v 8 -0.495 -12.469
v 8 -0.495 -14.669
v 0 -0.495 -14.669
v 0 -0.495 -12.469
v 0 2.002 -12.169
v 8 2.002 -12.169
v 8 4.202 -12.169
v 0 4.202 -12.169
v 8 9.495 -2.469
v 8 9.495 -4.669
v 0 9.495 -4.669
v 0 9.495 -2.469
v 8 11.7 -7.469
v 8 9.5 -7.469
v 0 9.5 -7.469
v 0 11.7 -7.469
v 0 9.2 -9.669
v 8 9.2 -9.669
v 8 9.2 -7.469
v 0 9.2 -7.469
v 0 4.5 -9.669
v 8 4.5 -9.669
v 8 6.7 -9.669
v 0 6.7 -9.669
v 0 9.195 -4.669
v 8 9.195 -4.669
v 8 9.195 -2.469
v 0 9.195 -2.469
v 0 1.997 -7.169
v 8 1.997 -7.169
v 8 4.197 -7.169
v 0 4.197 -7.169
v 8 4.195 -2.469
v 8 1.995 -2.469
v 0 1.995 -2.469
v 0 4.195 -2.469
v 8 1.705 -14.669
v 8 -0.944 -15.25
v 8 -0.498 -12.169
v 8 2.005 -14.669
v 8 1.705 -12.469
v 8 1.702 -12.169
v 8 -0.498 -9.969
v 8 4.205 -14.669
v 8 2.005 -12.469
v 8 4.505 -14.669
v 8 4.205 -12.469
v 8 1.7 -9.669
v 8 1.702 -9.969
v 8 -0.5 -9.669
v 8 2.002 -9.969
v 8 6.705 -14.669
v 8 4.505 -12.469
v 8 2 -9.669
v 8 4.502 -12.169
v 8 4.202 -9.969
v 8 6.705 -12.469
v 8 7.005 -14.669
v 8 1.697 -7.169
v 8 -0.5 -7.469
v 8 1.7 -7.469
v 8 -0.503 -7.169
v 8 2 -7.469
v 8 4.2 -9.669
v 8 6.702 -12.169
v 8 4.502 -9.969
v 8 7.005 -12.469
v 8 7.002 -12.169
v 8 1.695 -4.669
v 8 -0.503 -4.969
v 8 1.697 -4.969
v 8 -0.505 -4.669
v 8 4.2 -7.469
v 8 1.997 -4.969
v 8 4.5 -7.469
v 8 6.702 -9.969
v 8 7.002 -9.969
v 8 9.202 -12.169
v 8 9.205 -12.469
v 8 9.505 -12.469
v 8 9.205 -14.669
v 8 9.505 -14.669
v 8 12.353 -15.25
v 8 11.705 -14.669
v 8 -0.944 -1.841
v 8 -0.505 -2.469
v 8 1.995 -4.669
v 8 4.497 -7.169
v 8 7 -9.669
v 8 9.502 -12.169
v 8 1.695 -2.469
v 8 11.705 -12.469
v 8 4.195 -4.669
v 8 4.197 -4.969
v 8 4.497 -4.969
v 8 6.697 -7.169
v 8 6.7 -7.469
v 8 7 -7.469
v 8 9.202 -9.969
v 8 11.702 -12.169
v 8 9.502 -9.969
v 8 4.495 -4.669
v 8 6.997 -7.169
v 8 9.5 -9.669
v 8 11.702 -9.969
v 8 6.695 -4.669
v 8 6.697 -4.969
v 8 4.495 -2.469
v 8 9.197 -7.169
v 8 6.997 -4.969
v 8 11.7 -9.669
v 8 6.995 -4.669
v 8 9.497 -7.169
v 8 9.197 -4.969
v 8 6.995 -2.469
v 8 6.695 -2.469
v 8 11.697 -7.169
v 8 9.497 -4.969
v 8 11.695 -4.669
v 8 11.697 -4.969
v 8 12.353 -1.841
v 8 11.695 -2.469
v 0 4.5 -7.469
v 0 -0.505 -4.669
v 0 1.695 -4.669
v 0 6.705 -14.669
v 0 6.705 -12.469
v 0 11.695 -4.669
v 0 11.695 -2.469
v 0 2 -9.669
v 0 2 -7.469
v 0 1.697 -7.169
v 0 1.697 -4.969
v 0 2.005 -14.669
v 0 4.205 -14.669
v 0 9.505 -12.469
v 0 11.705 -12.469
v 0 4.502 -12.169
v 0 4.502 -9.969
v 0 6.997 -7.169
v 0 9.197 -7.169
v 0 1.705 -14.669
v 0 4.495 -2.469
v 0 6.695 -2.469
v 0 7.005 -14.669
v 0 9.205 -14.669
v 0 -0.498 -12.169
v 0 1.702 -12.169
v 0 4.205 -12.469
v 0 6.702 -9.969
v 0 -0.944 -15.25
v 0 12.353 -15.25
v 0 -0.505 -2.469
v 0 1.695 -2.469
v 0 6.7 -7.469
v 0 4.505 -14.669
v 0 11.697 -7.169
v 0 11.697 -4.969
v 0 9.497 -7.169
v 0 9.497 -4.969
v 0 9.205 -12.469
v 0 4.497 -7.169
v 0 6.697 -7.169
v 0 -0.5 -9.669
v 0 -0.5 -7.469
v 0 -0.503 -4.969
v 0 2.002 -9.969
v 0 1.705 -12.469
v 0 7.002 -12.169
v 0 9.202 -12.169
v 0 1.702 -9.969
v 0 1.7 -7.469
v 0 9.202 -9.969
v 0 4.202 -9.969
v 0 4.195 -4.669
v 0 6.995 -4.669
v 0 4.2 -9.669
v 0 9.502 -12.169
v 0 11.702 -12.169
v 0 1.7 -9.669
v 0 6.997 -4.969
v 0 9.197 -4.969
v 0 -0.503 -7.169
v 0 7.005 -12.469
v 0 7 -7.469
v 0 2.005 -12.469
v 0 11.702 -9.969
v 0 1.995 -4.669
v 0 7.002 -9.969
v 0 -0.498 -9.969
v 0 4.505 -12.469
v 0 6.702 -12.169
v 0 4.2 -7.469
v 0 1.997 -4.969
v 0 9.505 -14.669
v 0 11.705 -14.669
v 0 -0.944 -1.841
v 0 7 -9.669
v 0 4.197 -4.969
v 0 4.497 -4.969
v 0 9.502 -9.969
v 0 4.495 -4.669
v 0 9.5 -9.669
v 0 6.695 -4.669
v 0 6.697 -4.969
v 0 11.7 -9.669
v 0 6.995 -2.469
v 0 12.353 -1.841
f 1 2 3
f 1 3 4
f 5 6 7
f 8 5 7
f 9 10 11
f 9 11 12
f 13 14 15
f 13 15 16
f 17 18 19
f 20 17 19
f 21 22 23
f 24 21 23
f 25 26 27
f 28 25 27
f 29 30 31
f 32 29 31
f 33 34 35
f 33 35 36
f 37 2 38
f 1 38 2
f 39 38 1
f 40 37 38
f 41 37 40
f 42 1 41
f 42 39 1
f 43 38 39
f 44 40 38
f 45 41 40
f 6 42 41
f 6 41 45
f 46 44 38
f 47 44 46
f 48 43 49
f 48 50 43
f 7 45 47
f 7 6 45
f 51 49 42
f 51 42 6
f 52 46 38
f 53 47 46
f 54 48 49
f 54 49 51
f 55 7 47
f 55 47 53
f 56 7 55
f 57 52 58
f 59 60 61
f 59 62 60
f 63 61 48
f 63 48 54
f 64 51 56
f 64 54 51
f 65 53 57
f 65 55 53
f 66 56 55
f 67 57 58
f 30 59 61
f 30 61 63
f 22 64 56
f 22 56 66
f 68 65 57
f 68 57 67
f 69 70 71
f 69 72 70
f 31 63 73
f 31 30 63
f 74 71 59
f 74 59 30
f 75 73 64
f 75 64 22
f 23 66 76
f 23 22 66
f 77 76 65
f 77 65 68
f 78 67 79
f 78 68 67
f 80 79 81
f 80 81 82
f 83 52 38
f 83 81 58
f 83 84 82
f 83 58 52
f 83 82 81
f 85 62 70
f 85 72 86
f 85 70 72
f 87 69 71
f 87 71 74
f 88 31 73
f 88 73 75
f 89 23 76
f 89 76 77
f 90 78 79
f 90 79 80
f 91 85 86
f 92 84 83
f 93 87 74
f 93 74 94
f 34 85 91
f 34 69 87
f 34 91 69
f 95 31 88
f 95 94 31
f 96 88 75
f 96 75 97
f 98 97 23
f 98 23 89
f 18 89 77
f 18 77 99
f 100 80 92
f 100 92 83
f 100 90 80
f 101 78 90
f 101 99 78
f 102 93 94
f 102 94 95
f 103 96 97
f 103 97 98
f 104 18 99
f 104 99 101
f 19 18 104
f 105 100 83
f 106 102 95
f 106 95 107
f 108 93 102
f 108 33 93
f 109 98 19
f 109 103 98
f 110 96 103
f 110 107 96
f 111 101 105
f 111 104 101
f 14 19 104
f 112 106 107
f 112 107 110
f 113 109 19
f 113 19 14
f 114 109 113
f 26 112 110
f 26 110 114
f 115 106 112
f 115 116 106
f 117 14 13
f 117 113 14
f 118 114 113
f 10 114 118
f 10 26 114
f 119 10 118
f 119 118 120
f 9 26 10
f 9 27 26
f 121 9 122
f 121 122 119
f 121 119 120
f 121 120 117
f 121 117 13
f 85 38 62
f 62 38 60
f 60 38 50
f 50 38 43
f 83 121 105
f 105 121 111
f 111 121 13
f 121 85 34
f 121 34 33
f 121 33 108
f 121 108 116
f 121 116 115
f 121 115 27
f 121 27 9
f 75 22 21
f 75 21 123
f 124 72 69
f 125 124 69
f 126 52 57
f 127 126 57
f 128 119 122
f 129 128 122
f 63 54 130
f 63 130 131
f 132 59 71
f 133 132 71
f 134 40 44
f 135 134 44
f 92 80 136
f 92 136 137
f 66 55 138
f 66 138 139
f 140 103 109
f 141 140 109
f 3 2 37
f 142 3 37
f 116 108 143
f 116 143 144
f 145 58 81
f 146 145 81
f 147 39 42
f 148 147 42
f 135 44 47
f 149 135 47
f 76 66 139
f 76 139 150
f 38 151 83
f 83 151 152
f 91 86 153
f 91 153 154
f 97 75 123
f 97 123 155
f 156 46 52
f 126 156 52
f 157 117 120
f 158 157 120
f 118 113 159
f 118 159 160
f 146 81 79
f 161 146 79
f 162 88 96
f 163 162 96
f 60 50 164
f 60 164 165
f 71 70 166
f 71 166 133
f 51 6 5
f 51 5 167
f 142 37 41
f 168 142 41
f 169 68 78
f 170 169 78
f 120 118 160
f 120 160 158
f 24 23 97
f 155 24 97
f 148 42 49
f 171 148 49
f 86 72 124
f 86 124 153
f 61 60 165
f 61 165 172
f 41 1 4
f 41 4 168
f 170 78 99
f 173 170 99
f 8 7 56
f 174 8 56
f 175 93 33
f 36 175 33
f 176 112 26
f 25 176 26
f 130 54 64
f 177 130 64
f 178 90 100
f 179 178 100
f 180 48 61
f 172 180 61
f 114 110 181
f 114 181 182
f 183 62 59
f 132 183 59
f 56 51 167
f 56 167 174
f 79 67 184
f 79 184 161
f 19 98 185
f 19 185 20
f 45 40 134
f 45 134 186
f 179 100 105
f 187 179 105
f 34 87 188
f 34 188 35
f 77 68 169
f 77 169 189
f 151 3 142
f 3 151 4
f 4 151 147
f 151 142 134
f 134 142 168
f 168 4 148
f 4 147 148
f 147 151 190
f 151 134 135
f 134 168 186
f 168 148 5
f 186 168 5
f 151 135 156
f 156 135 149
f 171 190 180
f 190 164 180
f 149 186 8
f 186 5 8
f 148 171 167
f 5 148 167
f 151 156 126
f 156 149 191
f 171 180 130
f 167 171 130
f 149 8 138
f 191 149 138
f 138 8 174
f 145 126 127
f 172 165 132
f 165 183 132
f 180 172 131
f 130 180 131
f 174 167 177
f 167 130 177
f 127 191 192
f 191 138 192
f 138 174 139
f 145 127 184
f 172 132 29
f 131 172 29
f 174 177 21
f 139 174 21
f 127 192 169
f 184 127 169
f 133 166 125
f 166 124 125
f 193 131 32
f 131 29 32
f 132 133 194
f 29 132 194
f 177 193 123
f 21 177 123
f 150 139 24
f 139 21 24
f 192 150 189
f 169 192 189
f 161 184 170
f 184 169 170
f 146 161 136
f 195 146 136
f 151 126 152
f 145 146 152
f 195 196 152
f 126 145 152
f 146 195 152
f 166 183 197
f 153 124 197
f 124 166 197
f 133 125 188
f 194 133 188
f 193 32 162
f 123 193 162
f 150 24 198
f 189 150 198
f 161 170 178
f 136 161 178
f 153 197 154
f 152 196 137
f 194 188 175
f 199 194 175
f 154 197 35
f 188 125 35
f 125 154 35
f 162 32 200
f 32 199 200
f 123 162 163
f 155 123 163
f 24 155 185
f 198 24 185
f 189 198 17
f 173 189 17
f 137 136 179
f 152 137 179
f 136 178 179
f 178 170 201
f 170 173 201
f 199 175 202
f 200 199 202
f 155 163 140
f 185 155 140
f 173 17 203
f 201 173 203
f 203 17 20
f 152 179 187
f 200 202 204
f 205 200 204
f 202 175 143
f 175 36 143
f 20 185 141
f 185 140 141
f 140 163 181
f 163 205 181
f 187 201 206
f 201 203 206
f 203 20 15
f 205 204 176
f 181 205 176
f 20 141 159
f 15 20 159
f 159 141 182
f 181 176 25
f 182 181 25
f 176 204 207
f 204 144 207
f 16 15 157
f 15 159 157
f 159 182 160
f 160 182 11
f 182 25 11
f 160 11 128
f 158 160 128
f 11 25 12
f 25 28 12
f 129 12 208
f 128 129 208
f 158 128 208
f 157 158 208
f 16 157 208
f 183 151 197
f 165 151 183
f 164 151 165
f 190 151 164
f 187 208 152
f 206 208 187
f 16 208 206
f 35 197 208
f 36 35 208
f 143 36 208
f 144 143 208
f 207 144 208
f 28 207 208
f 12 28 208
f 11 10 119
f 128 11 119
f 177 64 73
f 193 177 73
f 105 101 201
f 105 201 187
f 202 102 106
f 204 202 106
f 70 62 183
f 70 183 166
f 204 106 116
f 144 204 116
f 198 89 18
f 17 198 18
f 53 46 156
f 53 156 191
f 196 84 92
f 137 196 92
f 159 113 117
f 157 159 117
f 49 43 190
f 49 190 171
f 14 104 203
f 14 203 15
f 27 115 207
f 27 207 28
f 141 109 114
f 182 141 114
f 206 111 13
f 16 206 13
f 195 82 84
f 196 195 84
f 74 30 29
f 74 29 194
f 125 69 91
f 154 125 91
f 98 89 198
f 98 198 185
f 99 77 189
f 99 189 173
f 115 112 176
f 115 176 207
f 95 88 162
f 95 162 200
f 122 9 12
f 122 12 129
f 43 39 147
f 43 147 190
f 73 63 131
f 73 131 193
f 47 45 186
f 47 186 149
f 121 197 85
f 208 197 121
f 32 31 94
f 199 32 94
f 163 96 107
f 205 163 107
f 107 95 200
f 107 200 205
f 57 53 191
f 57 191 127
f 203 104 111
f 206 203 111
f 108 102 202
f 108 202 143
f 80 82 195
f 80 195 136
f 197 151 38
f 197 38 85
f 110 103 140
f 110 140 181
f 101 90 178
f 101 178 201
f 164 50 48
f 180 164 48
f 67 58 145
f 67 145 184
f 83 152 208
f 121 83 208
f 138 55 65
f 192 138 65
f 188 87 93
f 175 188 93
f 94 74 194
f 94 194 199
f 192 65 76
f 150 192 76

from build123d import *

# Parameters (mm, degrees)
F0_W     = 13.296557
F0_H     = 13.408921
F0_W_2   = 2.2
F0_H_2   = 2.2
F1_DEPTH = 8


with BuildPart() as f1:
    # F0 (on Right) → F1 (new body)
    with BuildSketch(Plane.YZ):
        with Locations((5.704755, -8.545218)):
            Rectangle(F0_W, F0_H)
        with Locations((0.604655, -13.568869)):
            Rectangle(F0_W_2, F0_H_2, mode=Mode.SUBTRACT)
        with Locations((3.104655, -13.568869)):
            Rectangle(F0_W_2, F0_H_2, mode=Mode.SUBTRACT)
        with Locations((5.604655, -13.568869)):
            Rectangle(F0_W_2, F0_H_2, mode=Mode.SUBTRACT)
        with Locations((0.602163, -11.068871)):
            Rectangle(F0_W_2, F0_H_2, mode=Mode.SUBTRACT)
        with Locations((0.59967, -8.568872)):
            Rectangle(F0_W_2, F0_H_2, mode=Mode.SUBTRACT)
        with Locations((3.102163, -11.068871)):
            Rectangle(F0_W_2, F0_H_2, mode=Mode.SUBTRACT)
        with Locations((5.602163, -11.068871)):
            Rectangle(F0_W_2, F0_H_2, mode=Mode.SUBTRACT)
        with Locations((3.09967, -8.568872)):
            Rectangle(F0_W_2, F0_H_2, mode=Mode.SUBTRACT)
        with Locations((5.59967, -8.568872)):
            Rectangle(F0_W_2, F0_H_2, mode=Mode.SUBTRACT)
        with Locations((8.104655, -13.568869)):
            Rectangle(F0_W_2, F0_H_2, mode=Mode.SUBTRACT)
        with Locations((10.604655, -13.568869)):
            Rectangle(F0_W_2, F0_H_2, mode=Mode.SUBTRACT)
        with Locations((8.102163, -11.068871)):
            Rectangle(F0_W_2, F0_H_2, mode=Mode.SUBTRACT)
        with Locations((8.09967, -8.568872)):
            Rectangle(F0_W_2, F0_H_2, mode=Mode.SUBTRACT)
        with Locations((10.602163, -11.068871)):
            Rectangle(F0_W_2, F0_H_2, mode=Mode.SUBTRACT)
        with Locations((10.59967, -8.568872)):
            Rectangle(F0_W_2, F0_H_2, mode=Mode.SUBTRACT)
        with Locations((0.597177, -6.068873)):
            Rectangle(F0_W_2, F0_H_2, mode=Mode.SUBTRACT)
        with Locations((3.097177, -6.068873)):
            Rectangle(F0_W_2, F0_H_2, mode=Mode.SUBTRACT)
        with Locations((5.597177, -6.068873)):
            Rectangle(F0_W_2, F0_H_2, mode=Mode.SUBTRACT)
        with Locations((0.594684, -3.568874)):
            Rectangle(F0_W_2, F0_H_2, mode=Mode.SUBTRACT)
        with Locations((3.094684, -3.568874)):
            Rectangle(F0_W_2, F0_H_2, mode=Mode.SUBTRACT)
        with Locations((5.594684, -3.568874)):
            Rectangle(F0_W_2, F0_H_2, mode=Mode.SUBTRACT)
        with Locations((8.097177, -6.068873)):
            Rectangle(F0_W_2, F0_H_2, mode=Mode.SUBTRACT)
        with Locations((10.597177, -6.068873)):
            Rectangle(F0_W_2, F0_H_2, mode=Mode.SUBTRACT)
        with Locations((8.094684, -3.568874)):
            Rectangle(F0_W_2, F0_H_2, mode=Mode.SUBTRACT)
        with Locations((10.594684, -3.568874)):
            Rectangle(F0_W_2, F0_H_2, mode=Mode.SUBTRACT)
    extrude(amount=F1_DEPTH)


solid = f1.part
